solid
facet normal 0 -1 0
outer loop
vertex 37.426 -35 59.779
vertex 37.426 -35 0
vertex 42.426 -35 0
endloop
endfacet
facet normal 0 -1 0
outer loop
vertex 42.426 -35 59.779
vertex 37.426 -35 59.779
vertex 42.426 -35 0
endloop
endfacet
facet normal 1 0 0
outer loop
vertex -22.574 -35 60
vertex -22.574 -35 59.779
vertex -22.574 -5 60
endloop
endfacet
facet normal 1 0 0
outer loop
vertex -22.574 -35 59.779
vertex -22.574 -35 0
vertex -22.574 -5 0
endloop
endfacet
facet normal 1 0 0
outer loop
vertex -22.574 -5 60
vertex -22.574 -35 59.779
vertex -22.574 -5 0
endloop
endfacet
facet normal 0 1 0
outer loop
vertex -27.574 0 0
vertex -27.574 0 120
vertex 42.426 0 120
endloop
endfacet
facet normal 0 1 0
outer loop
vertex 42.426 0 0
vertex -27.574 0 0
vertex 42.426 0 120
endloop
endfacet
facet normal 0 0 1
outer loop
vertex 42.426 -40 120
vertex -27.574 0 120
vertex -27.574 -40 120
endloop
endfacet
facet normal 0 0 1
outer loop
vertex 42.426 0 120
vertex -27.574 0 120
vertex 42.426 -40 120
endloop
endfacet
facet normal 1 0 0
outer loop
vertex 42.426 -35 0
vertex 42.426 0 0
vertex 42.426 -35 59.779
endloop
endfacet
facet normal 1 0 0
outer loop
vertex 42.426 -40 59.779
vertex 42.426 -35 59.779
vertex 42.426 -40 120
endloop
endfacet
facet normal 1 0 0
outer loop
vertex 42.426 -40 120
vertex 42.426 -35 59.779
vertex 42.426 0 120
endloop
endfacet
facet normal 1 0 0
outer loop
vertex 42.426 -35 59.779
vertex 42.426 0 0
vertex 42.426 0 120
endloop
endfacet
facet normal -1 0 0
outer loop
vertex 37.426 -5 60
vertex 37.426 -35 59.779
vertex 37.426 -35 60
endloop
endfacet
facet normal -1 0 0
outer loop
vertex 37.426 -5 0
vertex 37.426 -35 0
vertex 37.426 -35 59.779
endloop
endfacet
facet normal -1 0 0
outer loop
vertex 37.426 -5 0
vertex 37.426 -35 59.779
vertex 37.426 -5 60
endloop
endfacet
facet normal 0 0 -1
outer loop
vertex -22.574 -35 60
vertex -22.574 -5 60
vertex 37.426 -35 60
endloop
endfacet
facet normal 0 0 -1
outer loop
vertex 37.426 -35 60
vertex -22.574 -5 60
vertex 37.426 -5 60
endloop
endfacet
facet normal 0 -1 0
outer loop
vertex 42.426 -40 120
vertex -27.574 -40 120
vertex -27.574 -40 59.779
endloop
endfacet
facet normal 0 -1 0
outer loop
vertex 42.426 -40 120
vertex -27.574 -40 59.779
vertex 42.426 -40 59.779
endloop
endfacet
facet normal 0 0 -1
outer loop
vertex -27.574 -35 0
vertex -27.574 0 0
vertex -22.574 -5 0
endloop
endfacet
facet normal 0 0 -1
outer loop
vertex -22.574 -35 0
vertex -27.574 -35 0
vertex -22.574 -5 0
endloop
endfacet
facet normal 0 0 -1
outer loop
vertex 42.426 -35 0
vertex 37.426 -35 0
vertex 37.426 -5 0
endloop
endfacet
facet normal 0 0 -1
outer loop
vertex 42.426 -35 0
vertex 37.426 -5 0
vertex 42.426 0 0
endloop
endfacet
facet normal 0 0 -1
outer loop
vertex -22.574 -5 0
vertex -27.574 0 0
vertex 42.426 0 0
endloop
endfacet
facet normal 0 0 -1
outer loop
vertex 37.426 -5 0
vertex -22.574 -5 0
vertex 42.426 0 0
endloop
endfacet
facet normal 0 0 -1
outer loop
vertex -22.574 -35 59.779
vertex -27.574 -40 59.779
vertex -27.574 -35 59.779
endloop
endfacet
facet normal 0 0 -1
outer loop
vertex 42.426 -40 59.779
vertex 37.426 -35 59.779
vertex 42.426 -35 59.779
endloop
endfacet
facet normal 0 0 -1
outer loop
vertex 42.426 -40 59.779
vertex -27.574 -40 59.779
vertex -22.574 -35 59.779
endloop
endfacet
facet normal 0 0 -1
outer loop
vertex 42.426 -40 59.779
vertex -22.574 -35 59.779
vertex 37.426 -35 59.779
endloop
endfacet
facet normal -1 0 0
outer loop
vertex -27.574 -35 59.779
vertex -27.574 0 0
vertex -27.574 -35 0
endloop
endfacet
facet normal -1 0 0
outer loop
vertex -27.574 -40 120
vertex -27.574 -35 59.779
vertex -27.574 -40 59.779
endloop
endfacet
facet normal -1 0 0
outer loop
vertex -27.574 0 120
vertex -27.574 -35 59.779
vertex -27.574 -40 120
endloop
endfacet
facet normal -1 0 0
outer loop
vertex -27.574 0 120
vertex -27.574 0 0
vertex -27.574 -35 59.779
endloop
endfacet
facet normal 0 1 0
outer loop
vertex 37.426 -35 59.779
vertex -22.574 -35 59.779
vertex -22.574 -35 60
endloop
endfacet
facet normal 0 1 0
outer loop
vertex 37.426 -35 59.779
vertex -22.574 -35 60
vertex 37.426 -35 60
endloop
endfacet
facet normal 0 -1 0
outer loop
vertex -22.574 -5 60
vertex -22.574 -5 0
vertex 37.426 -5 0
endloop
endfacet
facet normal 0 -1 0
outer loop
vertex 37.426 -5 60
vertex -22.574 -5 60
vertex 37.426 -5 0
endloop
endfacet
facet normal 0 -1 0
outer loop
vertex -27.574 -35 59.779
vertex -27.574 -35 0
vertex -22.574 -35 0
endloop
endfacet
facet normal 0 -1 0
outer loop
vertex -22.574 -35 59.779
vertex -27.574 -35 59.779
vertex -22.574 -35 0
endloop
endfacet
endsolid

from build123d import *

# Parameters (mm, degrees)
F0_W     = 70
F0_H     = 120
F1_DEPTH = 40
F2_W     = 60
F2_H     = 30
F3_DEPTH = 60
F4_W     = 70
F4_H     = 59.779245
F5_DEPTH = 5


with BuildPart() as f1:
    # F0 (on Front) → F1 (new body)
    with BuildSketch(Plane.XZ):
        with Locations((7.426471, 60)):
            Rectangle(F0_W, F0_H)
    extrude(amount=F1_DEPTH)

    # F2 (on Top) → F3 (cut)
    with BuildSketch(Plane.XY):
        with Locations((7.426471, -20)):
            Rectangle(F2_W, F2_H)
    extrude(amount=F3_DEPTH, mode=Mode.SUBTRACT)

    # F4 (on face) → F5 (cut)
    with BuildSketch(Plane.XZ.offset(40)):
        with Locations((7.426471, 29.889622)):
            Rectangle(F4_W, F4_H)
    extrude(amount=-F5_DEPTH, mode=Mode.SUBTRACT)


solid = f1.part
